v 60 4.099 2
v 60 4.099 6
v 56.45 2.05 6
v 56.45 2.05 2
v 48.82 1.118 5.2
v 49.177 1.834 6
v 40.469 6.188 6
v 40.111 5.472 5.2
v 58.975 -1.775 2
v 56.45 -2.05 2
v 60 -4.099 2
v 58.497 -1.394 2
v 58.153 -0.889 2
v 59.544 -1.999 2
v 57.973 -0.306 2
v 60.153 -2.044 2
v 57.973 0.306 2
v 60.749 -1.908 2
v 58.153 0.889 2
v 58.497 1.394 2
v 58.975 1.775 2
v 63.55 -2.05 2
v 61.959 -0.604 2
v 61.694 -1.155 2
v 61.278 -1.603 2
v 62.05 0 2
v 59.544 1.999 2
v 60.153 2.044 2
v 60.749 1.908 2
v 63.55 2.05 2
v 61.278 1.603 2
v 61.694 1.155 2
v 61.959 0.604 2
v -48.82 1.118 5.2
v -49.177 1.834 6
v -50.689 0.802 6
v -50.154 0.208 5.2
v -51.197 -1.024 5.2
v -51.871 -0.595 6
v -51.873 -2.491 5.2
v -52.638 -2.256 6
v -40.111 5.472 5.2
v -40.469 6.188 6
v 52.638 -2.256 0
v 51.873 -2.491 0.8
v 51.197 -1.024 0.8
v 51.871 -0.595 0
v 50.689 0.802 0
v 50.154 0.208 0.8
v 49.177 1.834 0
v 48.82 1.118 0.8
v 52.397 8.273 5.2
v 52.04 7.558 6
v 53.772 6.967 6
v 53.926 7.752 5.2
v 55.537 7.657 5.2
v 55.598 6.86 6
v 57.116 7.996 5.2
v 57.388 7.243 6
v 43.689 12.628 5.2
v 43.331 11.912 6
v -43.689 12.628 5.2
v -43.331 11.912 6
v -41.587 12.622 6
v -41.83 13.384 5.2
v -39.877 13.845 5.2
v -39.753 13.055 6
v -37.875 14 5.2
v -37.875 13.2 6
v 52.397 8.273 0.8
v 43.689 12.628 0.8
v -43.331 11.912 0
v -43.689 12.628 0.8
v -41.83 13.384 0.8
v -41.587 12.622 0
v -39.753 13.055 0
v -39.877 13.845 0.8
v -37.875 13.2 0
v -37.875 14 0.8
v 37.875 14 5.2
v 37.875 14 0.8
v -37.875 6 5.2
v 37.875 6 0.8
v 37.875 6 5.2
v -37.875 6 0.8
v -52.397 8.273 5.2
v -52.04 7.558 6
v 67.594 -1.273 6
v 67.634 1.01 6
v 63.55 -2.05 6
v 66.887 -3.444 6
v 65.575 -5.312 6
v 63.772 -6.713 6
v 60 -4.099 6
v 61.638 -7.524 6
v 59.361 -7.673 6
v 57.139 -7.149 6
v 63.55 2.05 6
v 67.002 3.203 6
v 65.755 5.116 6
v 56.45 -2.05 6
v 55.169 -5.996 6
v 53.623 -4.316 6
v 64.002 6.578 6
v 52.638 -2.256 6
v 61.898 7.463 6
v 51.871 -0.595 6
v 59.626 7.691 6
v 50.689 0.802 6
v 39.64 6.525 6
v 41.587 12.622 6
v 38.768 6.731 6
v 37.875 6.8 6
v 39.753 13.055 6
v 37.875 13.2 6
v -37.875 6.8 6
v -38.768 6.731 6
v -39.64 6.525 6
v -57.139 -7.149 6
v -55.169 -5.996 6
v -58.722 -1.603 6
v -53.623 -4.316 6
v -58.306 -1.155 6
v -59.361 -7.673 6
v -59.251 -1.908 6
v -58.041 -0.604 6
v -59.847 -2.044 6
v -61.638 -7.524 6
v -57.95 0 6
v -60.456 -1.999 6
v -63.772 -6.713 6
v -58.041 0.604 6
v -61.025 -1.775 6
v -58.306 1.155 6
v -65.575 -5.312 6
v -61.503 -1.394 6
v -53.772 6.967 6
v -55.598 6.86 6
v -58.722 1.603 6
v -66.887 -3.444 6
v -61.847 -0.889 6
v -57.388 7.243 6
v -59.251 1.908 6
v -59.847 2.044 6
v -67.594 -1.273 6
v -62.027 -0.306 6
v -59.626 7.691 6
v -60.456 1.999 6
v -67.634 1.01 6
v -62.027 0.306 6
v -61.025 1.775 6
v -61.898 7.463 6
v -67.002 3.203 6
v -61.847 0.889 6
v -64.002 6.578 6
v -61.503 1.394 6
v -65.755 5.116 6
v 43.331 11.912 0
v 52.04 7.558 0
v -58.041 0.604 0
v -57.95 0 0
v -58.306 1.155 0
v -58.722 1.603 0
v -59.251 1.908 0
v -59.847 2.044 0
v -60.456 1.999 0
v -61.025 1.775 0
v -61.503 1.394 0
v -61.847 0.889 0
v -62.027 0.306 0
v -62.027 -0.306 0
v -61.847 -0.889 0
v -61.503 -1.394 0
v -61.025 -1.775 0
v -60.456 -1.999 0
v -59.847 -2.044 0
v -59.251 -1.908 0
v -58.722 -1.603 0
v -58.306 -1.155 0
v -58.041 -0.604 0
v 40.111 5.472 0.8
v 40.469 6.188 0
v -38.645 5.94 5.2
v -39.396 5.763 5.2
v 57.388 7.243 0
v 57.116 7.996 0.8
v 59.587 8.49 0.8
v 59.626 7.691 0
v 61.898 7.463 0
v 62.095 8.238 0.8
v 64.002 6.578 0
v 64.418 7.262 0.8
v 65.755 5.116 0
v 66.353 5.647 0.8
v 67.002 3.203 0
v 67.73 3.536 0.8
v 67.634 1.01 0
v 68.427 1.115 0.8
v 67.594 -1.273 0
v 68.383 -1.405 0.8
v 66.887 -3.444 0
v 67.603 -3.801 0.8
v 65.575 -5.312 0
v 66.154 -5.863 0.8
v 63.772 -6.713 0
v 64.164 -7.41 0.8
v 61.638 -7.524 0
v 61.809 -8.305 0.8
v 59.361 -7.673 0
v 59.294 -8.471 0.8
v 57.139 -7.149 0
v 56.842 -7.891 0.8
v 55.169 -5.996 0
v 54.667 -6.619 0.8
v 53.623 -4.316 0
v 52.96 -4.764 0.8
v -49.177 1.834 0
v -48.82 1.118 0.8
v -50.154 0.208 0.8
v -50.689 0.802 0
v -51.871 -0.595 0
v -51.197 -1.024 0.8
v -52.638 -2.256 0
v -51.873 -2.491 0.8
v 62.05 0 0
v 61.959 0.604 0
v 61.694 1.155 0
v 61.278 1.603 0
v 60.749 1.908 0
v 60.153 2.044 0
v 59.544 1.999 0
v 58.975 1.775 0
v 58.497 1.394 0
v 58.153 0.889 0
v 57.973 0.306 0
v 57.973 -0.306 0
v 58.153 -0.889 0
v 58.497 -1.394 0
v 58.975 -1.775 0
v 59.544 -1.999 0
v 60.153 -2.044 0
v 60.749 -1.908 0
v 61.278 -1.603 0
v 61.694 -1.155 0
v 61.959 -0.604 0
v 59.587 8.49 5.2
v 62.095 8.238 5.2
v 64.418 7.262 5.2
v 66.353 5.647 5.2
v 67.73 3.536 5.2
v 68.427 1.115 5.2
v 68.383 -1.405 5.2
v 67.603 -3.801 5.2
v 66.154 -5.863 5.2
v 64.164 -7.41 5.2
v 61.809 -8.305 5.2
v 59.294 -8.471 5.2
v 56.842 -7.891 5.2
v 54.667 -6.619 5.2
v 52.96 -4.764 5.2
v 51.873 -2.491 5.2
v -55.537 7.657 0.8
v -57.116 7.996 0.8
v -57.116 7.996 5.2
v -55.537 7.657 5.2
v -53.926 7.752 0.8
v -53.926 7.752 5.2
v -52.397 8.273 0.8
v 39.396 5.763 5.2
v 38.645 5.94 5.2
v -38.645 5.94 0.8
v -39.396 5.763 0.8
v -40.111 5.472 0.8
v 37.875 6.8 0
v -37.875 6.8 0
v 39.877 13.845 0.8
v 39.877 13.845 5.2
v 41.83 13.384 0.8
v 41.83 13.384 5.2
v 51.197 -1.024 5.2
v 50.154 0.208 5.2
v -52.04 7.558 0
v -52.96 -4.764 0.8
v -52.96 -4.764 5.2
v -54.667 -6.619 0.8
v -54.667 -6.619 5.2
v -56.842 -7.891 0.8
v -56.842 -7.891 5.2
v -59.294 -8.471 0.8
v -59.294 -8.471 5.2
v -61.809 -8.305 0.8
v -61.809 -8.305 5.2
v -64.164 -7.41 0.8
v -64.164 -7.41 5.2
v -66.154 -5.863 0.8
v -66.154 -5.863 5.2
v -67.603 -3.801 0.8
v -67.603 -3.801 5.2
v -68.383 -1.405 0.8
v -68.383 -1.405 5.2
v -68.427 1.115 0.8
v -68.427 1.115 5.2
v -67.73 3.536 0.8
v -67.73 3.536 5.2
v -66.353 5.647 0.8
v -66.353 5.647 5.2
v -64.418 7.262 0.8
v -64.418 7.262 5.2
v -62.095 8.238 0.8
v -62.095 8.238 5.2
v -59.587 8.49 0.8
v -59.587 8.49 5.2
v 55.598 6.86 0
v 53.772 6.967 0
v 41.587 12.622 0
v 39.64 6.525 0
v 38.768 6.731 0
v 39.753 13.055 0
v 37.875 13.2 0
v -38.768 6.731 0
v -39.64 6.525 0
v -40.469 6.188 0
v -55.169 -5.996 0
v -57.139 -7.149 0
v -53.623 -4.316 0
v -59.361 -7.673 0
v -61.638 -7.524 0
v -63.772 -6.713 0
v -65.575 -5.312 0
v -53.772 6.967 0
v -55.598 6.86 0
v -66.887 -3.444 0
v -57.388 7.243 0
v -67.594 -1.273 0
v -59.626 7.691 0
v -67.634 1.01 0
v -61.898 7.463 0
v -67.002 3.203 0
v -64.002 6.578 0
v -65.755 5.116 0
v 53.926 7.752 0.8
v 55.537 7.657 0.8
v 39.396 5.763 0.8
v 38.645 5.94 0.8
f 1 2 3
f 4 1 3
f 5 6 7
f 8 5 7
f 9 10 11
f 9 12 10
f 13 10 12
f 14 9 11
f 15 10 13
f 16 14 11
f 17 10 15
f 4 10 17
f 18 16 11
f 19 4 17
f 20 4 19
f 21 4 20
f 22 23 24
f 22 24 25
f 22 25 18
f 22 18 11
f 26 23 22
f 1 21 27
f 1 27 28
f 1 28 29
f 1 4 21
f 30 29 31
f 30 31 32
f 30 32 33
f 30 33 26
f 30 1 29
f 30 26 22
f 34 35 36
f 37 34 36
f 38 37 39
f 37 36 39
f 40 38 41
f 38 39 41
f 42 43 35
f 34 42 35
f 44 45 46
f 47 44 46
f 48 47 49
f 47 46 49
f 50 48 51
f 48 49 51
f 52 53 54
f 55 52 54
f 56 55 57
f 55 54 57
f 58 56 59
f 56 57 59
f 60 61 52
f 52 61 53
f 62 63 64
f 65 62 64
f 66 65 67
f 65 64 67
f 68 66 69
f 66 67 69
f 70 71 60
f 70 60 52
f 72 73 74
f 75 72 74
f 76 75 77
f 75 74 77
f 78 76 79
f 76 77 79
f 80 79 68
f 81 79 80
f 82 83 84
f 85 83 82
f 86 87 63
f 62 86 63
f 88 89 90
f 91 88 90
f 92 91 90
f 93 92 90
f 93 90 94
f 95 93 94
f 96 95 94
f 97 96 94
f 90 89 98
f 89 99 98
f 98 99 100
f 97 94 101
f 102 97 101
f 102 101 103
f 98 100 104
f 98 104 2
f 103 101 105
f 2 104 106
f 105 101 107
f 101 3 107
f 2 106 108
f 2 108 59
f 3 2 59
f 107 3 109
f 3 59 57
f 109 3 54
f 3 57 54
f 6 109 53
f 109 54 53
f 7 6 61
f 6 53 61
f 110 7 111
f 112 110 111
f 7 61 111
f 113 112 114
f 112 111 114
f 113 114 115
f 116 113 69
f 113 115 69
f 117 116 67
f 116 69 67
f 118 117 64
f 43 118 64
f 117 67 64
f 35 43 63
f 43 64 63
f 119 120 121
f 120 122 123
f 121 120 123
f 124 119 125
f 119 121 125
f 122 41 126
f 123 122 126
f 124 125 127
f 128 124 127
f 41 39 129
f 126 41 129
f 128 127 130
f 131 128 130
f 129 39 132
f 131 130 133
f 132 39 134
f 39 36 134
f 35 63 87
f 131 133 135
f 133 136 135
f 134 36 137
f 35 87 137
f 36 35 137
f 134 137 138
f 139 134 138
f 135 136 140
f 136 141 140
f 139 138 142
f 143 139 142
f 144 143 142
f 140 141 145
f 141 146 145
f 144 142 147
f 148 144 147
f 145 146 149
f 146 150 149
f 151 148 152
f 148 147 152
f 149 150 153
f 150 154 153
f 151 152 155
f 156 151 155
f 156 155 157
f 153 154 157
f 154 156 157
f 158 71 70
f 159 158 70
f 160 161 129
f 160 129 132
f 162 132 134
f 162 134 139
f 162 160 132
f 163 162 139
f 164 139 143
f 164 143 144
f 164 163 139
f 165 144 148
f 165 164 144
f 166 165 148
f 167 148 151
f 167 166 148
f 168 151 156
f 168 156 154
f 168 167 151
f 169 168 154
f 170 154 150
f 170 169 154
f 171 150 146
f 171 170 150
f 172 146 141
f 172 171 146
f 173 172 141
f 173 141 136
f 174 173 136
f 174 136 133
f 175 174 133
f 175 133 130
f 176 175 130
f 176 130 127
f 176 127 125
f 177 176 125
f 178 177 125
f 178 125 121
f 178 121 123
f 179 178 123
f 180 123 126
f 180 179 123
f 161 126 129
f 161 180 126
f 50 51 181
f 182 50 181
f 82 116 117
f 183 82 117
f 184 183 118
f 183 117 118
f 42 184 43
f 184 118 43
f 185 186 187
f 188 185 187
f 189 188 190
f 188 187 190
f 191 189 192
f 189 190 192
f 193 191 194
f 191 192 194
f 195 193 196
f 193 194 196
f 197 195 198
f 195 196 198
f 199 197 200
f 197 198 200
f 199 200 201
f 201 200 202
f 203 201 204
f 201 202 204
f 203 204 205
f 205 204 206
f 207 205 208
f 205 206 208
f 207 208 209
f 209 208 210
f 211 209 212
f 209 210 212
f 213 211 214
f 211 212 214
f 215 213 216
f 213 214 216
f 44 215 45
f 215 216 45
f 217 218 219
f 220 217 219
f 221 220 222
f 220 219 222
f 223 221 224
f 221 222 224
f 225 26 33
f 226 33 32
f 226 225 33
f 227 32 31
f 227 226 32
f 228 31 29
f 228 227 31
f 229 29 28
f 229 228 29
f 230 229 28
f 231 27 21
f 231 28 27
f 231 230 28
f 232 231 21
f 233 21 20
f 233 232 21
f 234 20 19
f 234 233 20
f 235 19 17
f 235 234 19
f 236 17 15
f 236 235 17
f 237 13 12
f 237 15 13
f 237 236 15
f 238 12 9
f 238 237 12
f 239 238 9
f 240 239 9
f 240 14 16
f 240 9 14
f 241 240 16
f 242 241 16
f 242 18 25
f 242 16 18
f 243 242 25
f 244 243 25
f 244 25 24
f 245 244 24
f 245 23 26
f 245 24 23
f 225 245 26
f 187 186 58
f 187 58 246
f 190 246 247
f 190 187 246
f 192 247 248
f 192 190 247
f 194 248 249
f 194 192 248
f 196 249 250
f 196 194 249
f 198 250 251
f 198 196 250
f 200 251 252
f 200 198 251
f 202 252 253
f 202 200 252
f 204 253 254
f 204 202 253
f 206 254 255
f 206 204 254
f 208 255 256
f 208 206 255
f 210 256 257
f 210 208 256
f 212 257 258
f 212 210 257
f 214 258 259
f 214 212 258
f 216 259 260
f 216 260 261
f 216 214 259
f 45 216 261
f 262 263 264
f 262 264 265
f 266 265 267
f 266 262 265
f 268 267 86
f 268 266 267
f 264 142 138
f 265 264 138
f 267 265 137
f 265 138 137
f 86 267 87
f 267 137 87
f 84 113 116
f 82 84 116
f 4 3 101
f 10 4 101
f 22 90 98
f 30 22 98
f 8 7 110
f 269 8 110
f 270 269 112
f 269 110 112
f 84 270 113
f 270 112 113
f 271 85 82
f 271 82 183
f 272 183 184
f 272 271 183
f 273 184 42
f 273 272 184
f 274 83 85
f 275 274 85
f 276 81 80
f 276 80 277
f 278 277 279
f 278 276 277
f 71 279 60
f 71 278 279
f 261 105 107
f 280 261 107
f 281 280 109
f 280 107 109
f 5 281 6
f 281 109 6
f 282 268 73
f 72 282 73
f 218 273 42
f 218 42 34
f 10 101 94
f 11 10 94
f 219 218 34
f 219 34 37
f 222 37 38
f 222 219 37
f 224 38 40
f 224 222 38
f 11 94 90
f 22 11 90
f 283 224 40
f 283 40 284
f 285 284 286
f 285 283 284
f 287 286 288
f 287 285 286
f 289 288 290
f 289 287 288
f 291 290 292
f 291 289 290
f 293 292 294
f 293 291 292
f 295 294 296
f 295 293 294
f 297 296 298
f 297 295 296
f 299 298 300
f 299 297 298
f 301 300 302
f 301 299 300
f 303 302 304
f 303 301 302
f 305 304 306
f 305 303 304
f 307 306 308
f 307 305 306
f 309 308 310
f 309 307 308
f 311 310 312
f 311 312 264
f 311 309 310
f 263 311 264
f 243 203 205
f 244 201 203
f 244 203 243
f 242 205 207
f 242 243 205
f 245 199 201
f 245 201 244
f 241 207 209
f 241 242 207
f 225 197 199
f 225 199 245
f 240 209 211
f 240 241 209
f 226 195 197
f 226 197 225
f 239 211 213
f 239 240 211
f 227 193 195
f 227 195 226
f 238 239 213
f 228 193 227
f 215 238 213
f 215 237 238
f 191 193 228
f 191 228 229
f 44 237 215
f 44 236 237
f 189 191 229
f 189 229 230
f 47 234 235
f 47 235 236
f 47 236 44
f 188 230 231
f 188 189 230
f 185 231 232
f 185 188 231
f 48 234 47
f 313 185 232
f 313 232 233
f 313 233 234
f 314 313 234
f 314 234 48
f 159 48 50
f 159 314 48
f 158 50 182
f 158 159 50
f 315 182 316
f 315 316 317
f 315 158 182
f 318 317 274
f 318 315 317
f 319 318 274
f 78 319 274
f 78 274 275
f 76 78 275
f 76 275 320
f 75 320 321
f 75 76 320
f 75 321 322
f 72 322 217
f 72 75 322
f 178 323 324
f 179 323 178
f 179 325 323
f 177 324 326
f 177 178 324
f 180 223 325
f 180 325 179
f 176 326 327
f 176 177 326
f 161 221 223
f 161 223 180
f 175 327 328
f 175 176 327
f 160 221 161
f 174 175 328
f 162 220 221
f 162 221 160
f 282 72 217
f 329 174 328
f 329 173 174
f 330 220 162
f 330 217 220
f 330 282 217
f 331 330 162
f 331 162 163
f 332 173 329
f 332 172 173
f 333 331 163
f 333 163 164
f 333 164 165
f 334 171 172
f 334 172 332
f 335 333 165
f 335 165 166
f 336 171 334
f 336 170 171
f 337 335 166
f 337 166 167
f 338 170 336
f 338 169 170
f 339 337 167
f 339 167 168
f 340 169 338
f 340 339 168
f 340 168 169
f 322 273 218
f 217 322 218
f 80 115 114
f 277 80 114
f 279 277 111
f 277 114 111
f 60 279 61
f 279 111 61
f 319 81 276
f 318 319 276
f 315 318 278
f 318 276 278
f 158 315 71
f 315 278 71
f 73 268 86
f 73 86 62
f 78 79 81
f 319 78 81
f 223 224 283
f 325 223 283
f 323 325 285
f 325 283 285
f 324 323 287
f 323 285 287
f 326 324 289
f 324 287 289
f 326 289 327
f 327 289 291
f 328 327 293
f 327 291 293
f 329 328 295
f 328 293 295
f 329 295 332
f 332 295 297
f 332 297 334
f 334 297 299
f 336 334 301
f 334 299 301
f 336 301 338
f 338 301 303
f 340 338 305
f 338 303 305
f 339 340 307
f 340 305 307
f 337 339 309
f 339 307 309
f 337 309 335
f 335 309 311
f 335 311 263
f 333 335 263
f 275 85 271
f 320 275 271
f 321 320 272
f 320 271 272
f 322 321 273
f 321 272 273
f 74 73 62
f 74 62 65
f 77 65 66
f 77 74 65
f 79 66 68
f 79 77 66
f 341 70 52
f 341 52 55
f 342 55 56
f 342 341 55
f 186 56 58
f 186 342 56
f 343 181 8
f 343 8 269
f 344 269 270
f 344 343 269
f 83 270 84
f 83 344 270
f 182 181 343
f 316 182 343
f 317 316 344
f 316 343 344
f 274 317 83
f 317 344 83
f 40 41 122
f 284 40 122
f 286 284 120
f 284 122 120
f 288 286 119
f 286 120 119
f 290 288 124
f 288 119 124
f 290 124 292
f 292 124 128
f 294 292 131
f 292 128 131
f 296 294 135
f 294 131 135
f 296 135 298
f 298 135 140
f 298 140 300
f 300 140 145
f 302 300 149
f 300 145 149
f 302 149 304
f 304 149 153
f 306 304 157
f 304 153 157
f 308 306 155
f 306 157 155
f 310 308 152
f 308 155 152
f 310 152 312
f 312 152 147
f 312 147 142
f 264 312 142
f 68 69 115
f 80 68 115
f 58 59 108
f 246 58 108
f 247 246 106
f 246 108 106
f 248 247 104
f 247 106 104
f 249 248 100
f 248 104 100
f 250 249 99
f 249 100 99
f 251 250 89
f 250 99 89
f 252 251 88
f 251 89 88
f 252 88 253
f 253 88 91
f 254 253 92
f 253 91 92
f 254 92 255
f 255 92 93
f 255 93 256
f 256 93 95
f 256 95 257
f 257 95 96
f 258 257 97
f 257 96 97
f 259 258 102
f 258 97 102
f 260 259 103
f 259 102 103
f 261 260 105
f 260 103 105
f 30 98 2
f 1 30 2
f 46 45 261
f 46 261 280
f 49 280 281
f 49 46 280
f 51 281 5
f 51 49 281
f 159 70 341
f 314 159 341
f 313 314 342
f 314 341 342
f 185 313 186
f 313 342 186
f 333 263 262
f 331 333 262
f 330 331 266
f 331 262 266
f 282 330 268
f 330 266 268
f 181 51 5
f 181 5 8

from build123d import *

# Parameters (mm, degrees)
SKETCH1_R           = 2.05
BOSS_EXTRUDE1_DEPTH = 6
CUT_EXTRUDE1_DEPTH  = 4
CHAMFER3_SIZE       = 0.8


with BuildPart() as part:
    # Sketch1 → Boss-Extrude1 (new body)
    with BuildSketch(Plane.XY):
        with BuildLine():
            Line((-52.397368877, 8.273451517), (-43.689164944, 12.627553483))
            ThreePointArc((-43.689164944, 12.627553483), (-40.86217617, 13.652236863), (-37.875388203, 14))
            Line((-37.875388203, 14), (37.875388203, 14))
            ThreePointArc((37.875388203, 14), (40.86217617, 13.652236863), (43.689164944, 12.627553483))
            Line((43.689164944, 12.627553483), (52.397368877, 8.273451517))
            ThreePointArc((52.397368877, 8.273451517), (54.728318318, 7.650368424), (57.116243367, 7.995870664))
            ThreePointArc((57.116243367, 7.995870664), (67.602631123, -3.801315562), (51.873049489, -2.490517092))
            ThreePointArc((51.873049489, -2.490517092), (50.716696252, -0.372875708), (48.819660113, 1.118033989))
            Line((48.819660113, 1.118033989), (40.11145618, 5.472135955))
            ThreePointArc((40.11145618, 5.472135955), (39.024152805, 5.866244947), (37.875388203, 6))
            Line((37.875388203, 6), (-37.875388203, 6))
            ThreePointArc((-37.875388203, 6), (-39.024152805, 5.866244947), (-40.11145618, 5.472135955))
            Line((-40.11145618, 5.472135955), (-48.819660113, 1.118033989))
            ThreePointArc((-48.819660113, 1.118033989), (-50.716696252, -0.372875708), (-51.873049489, -2.490517092))
            ThreePointArc((-51.873049489, -2.490517092), (-67.602631123, -3.801315562), (-57.116243367, 7.995870664))
            ThreePointArc((-57.116243367, 7.995870664), (-54.728318318, 7.650368424), (-52.397368877, 8.273451517))
        make_face()
        with Locations((-60, 0)):
            Circle(SKETCH1_R, mode=Mode.SUBTRACT)
        with Locations((60, 0)):
            Circle(SKETCH1_R, mode=Mode.SUBTRACT)
    extrude(amount=BOSS_EXTRUDE1_DEPTH)

    # Sketch3 → Cut-Extrude1 (cut)
    with BuildSketch(Plane.XY.offset(6)):
        Polygon((60, 4.099186911), (56.45, 2.049593456), (56.45, -2.049593456), (60, -4.099186911), (63.55, -2.049593456), (63.55, 2.049593456), align=None)
    extrude(amount=-CUT_EXTRUDE1_DEPTH, mode=Mode.SUBTRACT)

    # Chamfer3
    chamfer3_edges = [part.edges().sort_by_distance(p)[0] for p in [
        (-40.86217617, 13.652236863, 6),
        (48.04326691, 10.4505025, 0),
        (54.728318318, 7.650368424, 0),
        (67.602631123, -3.801315562, 0),
        (-48.04326691, 10.4505025, 6),
        (50.716696252, -0.372875708, 0),
        (44.465558146, 3.295084972, 0),
        (39.024152805, 5.866244947, 0),
        (0, 6, 0),
        (-39.024152805, 5.866244947, 0),
        (-44.465558146, 3.295084972, 0),
        (-50.716696252, -0.372875708, 0),
        (-67.602631123, -3.801315562, 0),
        (-54.728318318, 7.650368424, 0),
        (-48.04326691, 10.4505025, 0),
        (-54.728318318, 7.650368424, 6),
        (-40.86217617, 13.652236863, 0),
        (0, 14, 0),
        (40.86217617, 13.652236863, 0),
        (-67.602631123, -3.801315562, 6),
        (-50.716696252, -0.372875708, 6),
        (-44.465558146, 3.295084972, 6),
        (-39.024152805, 5.866244947, 6),
        (0, 6, 6),
        (39.024152805, 5.866244947, 6),
        (44.465558146, 3.295084972, 6),
        (40.86217617, 13.652236863, 6),
        (50.716696252, -0.372875708, 6),
        (67.602631123, -3.801315562, 6),
        (54.728318318, 7.650368424, 6),
        (48.04326691, 10.4505025, 6),
        (0, 14, 6),
    ]]
    chamfer(chamfer3_edges, length=CHAMFER3_SIZE)


solid = part.part
